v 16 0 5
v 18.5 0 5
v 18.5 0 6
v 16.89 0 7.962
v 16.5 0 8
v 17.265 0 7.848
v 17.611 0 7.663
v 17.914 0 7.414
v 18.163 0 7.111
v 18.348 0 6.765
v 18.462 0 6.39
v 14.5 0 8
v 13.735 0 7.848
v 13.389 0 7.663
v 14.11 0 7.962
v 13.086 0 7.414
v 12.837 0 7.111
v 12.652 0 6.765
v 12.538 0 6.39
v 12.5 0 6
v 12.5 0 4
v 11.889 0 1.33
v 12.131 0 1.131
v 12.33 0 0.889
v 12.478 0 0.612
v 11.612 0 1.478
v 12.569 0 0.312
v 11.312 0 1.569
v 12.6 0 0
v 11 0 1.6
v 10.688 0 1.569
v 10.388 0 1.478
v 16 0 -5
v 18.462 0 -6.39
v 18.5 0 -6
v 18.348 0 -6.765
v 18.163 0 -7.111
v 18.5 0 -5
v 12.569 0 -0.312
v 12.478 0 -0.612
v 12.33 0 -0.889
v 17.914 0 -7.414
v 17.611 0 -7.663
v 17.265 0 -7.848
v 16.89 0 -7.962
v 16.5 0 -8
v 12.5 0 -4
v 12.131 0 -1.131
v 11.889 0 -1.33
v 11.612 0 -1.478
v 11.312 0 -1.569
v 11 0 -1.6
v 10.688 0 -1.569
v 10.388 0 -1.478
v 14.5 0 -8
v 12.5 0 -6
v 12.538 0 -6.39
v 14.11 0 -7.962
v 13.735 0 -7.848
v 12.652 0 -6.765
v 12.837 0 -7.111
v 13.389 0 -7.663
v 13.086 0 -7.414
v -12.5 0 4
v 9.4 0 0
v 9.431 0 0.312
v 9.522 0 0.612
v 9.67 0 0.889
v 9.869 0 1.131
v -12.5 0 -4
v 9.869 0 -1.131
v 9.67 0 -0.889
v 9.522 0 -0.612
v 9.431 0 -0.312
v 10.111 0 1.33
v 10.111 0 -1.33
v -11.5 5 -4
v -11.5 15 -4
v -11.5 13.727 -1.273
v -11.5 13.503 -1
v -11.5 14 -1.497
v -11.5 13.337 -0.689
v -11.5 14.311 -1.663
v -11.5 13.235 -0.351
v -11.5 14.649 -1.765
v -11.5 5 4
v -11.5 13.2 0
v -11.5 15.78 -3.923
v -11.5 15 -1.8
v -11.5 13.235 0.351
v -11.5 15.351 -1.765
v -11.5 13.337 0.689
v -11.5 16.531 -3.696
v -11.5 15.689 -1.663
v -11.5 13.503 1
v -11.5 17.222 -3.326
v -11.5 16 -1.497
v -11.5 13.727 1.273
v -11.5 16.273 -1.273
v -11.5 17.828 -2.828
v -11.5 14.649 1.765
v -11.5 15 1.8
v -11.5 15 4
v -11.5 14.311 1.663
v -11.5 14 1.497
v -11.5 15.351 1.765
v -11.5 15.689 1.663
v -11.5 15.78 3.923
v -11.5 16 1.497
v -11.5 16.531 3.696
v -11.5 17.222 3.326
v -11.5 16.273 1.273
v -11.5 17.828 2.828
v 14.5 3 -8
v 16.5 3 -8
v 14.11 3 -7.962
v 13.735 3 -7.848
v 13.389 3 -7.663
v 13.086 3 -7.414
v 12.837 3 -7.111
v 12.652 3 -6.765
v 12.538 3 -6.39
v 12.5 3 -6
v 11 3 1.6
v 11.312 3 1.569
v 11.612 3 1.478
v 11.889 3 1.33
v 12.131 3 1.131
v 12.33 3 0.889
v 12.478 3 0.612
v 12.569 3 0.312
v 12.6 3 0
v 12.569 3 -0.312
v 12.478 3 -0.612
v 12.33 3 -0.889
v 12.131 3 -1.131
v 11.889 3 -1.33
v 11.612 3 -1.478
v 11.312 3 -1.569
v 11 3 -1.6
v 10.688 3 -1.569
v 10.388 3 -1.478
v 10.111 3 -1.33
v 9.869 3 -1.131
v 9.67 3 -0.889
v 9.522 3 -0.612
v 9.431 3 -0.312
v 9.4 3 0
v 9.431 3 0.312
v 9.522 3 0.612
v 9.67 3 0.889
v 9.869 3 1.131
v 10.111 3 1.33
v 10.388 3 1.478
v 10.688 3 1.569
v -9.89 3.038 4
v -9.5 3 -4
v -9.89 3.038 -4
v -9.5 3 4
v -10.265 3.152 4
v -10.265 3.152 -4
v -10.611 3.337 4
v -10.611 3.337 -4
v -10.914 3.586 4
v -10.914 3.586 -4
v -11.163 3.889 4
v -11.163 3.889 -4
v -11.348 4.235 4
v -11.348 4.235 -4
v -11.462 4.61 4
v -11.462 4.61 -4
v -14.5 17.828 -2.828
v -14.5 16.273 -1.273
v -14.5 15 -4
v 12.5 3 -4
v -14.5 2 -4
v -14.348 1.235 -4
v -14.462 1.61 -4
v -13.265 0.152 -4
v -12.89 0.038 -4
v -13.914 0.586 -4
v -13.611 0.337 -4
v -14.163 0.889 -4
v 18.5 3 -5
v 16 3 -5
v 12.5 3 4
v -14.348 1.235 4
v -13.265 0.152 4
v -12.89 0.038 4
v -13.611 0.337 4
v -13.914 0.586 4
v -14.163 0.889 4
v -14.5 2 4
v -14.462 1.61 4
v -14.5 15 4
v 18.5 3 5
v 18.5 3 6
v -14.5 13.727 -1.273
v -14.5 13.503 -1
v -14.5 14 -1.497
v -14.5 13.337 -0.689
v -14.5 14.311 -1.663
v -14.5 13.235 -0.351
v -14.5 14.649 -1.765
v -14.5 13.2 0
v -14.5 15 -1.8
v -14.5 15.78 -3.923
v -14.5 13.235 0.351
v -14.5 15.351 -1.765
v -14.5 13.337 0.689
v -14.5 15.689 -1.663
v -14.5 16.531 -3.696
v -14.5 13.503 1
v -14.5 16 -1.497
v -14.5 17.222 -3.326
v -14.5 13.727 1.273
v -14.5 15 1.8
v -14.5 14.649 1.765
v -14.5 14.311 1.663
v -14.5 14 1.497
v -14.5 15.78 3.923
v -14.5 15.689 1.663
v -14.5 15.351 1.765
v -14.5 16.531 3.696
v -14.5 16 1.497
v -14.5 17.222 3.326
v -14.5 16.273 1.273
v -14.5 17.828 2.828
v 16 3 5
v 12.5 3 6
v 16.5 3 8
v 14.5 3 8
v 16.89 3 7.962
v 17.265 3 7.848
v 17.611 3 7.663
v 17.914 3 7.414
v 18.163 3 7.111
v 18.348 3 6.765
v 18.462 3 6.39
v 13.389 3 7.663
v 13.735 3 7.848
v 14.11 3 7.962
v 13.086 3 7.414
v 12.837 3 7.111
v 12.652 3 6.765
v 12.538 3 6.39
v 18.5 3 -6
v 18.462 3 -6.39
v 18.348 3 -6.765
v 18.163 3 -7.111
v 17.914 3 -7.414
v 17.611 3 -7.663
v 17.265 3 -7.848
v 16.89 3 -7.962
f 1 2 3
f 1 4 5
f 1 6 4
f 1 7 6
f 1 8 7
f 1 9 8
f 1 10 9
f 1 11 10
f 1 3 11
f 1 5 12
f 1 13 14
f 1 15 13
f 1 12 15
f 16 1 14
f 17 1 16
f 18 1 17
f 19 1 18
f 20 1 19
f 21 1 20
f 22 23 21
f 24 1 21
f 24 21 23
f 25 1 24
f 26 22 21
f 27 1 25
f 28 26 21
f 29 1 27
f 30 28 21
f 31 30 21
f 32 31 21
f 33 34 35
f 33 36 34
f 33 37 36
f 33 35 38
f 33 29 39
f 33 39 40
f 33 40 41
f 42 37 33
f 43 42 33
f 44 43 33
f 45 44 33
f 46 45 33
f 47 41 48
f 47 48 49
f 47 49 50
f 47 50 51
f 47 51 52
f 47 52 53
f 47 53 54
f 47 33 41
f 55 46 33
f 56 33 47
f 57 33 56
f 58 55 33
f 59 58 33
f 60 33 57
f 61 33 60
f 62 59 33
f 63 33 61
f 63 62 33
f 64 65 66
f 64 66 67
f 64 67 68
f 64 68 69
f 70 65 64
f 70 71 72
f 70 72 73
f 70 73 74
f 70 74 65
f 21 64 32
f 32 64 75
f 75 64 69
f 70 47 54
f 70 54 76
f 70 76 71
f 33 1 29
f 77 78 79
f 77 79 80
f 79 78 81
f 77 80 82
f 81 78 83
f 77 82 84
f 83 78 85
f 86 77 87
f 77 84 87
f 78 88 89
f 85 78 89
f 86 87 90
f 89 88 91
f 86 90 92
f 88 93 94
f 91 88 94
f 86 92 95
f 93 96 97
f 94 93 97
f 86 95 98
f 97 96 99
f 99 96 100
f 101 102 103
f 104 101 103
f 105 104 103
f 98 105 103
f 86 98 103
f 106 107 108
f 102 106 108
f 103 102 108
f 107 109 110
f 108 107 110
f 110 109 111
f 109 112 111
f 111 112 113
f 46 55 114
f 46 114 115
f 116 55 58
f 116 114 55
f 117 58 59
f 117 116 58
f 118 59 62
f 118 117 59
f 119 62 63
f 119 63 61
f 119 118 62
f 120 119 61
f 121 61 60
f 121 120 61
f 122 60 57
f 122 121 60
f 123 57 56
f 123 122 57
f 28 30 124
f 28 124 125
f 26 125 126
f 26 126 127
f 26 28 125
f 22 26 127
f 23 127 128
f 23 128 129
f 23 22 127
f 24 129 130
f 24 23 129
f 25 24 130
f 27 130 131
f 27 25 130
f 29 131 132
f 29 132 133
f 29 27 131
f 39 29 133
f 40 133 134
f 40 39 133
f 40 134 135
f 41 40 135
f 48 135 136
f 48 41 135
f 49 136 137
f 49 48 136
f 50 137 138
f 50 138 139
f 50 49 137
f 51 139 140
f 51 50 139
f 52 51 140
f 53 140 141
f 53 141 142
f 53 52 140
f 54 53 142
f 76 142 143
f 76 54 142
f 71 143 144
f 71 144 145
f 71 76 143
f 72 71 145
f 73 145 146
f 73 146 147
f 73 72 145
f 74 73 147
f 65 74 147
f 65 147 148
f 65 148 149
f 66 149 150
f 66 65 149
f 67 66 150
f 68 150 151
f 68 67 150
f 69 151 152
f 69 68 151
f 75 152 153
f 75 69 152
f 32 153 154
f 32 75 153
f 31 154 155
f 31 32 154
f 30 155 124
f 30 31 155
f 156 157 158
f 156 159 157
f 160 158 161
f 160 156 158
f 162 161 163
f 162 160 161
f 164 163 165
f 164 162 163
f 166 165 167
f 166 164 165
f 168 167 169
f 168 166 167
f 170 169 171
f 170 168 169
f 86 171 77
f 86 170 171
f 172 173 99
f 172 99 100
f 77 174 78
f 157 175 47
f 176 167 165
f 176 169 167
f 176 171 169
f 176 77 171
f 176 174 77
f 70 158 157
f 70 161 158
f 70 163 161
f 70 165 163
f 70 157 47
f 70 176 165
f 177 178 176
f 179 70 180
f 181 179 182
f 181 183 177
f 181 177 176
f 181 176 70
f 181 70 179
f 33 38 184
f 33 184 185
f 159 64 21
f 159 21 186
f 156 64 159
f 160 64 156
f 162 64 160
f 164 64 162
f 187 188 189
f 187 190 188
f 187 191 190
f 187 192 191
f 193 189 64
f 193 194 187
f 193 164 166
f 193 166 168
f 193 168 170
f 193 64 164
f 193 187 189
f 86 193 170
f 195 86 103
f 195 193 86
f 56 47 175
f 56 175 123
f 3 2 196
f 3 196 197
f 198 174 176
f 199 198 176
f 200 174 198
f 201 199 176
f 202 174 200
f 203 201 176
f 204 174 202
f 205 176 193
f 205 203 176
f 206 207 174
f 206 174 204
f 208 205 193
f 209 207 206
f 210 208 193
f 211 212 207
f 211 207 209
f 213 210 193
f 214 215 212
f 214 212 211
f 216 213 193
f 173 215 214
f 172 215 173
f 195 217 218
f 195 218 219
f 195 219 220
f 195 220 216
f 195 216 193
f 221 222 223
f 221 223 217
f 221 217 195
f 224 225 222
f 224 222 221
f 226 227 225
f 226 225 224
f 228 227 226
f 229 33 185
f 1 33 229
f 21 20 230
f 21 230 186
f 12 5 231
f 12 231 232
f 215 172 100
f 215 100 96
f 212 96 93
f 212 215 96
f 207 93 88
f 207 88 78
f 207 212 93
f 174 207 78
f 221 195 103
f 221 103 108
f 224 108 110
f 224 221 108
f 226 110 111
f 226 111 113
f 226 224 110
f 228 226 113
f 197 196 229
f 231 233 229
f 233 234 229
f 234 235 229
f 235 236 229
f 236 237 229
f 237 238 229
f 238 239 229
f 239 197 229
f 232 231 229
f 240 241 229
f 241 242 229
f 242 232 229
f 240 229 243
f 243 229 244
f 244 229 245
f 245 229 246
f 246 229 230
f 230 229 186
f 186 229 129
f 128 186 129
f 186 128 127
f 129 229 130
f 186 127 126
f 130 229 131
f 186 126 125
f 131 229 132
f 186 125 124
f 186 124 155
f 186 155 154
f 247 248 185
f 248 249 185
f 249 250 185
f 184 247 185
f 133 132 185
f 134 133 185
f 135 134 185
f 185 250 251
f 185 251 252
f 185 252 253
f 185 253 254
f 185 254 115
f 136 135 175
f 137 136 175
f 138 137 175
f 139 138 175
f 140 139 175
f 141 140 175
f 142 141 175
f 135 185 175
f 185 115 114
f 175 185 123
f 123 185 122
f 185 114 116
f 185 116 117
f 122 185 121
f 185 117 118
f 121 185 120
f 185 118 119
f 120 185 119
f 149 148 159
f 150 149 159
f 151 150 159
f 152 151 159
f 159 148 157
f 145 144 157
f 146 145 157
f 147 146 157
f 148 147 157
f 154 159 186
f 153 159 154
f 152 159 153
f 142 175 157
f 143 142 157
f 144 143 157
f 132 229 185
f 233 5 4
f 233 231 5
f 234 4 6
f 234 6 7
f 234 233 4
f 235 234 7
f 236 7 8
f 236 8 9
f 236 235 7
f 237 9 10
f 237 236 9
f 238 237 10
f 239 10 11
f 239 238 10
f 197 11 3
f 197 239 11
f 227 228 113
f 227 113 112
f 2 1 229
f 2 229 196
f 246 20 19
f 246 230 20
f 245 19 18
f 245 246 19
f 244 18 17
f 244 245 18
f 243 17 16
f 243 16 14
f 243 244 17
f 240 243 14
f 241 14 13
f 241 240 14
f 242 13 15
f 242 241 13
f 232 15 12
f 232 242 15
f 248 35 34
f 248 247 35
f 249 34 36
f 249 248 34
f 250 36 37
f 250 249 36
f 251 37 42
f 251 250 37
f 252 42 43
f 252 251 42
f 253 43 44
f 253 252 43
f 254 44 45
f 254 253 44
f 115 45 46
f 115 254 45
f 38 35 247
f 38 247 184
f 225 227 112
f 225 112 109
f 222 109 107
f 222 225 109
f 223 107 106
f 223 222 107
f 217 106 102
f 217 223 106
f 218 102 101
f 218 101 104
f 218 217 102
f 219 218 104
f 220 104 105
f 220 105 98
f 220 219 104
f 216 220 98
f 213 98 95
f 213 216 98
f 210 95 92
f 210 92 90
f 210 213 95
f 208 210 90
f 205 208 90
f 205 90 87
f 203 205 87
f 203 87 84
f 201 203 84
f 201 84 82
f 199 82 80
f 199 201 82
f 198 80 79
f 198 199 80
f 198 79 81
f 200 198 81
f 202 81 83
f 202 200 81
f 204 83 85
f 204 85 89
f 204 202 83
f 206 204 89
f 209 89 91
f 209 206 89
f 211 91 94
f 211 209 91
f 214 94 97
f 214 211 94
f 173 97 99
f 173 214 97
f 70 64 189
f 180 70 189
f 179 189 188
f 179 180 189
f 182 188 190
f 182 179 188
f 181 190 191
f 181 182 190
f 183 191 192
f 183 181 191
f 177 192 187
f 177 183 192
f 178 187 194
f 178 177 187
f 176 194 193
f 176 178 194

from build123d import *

# Parameters (mm, degrees)
SKETCH_1_R      = 1.6
EXTRUDE_1_DEPTH = 3
EXTRUDE_2_DEPTH = 3
FILLET_1_R      = 2
FILLET_2_R      = 2


with BuildPart() as part:
    # 草图1 → 凸台-拉伸1 (new body)
    with BuildSketch(Plane(origin=(0, 0, 0), x_dir=(1, 0, 0), z_dir=(0, 1, 0))):
        Polygon((-14.5, -4), (-14.5, 4), (12.5, 4), (12.5, 8), (18.5, 8), (18.5, 5), (16, 5), (16, -5), (18.5, -5), (18.5, -8), (12.5, -8), (12.5, -4), align=None)
        with Locations(Location((11, 0, 0), (0, 0, 270))):
            Circle(SKETCH_1_R, mode=Mode.SUBTRACT)
    extrude(amount=EXTRUDE_1_DEPTH)

    # 草图3 → 凸台-拉伸2 (add)
    with BuildSketch(Plane.ZY.offset(14.5)):
        with BuildLine():
            Line((-4, 15), (-4, 3))
            Line((-4, 3), (4, 3))
            Line((4, 3), (4, 15))
            ThreePointArc((4, 15), (3.69551813, 16.530733729), (2.828427125, 17.828427125))
            Line((2.828427125, 17.828427125), (1.272792206, 16.272792206))
            ThreePointArc((1.272792206, 16.272792206), (0, 13.2), (-1.272792206, 16.272792206))
            Line((-1.272792206, 16.272792206), (-2.828427125, 17.828427125))
            ThreePointArc((-2.828427125, 17.828427125), (-3.69551813, 16.530733729), (-4, 15))
        make_face()
    extrude(amount=-EXTRUDE_2_DEPTH)

    # 圆角1
    fillet_1_edges = [part.edges().sort_by_distance(p)[0] for p in [
        (12.5, 1.5, -8),
        (18.5, 1.5, -8),
        (18.5, 1.5, 8),
        (12.5, 1.5, 8),
    ]]
    fillet(fillet_1_edges, radius=FILLET_1_R)

    # 圆角2
    fillet_2_edges = [part.edges().sort_by_distance(p)[0] for p in [
        (-14.5, 0, 0),
        (-11.5, 3, 0),
    ]]
    fillet(fillet_2_edges, radius=FILLET_2_R)


solid = part.part
